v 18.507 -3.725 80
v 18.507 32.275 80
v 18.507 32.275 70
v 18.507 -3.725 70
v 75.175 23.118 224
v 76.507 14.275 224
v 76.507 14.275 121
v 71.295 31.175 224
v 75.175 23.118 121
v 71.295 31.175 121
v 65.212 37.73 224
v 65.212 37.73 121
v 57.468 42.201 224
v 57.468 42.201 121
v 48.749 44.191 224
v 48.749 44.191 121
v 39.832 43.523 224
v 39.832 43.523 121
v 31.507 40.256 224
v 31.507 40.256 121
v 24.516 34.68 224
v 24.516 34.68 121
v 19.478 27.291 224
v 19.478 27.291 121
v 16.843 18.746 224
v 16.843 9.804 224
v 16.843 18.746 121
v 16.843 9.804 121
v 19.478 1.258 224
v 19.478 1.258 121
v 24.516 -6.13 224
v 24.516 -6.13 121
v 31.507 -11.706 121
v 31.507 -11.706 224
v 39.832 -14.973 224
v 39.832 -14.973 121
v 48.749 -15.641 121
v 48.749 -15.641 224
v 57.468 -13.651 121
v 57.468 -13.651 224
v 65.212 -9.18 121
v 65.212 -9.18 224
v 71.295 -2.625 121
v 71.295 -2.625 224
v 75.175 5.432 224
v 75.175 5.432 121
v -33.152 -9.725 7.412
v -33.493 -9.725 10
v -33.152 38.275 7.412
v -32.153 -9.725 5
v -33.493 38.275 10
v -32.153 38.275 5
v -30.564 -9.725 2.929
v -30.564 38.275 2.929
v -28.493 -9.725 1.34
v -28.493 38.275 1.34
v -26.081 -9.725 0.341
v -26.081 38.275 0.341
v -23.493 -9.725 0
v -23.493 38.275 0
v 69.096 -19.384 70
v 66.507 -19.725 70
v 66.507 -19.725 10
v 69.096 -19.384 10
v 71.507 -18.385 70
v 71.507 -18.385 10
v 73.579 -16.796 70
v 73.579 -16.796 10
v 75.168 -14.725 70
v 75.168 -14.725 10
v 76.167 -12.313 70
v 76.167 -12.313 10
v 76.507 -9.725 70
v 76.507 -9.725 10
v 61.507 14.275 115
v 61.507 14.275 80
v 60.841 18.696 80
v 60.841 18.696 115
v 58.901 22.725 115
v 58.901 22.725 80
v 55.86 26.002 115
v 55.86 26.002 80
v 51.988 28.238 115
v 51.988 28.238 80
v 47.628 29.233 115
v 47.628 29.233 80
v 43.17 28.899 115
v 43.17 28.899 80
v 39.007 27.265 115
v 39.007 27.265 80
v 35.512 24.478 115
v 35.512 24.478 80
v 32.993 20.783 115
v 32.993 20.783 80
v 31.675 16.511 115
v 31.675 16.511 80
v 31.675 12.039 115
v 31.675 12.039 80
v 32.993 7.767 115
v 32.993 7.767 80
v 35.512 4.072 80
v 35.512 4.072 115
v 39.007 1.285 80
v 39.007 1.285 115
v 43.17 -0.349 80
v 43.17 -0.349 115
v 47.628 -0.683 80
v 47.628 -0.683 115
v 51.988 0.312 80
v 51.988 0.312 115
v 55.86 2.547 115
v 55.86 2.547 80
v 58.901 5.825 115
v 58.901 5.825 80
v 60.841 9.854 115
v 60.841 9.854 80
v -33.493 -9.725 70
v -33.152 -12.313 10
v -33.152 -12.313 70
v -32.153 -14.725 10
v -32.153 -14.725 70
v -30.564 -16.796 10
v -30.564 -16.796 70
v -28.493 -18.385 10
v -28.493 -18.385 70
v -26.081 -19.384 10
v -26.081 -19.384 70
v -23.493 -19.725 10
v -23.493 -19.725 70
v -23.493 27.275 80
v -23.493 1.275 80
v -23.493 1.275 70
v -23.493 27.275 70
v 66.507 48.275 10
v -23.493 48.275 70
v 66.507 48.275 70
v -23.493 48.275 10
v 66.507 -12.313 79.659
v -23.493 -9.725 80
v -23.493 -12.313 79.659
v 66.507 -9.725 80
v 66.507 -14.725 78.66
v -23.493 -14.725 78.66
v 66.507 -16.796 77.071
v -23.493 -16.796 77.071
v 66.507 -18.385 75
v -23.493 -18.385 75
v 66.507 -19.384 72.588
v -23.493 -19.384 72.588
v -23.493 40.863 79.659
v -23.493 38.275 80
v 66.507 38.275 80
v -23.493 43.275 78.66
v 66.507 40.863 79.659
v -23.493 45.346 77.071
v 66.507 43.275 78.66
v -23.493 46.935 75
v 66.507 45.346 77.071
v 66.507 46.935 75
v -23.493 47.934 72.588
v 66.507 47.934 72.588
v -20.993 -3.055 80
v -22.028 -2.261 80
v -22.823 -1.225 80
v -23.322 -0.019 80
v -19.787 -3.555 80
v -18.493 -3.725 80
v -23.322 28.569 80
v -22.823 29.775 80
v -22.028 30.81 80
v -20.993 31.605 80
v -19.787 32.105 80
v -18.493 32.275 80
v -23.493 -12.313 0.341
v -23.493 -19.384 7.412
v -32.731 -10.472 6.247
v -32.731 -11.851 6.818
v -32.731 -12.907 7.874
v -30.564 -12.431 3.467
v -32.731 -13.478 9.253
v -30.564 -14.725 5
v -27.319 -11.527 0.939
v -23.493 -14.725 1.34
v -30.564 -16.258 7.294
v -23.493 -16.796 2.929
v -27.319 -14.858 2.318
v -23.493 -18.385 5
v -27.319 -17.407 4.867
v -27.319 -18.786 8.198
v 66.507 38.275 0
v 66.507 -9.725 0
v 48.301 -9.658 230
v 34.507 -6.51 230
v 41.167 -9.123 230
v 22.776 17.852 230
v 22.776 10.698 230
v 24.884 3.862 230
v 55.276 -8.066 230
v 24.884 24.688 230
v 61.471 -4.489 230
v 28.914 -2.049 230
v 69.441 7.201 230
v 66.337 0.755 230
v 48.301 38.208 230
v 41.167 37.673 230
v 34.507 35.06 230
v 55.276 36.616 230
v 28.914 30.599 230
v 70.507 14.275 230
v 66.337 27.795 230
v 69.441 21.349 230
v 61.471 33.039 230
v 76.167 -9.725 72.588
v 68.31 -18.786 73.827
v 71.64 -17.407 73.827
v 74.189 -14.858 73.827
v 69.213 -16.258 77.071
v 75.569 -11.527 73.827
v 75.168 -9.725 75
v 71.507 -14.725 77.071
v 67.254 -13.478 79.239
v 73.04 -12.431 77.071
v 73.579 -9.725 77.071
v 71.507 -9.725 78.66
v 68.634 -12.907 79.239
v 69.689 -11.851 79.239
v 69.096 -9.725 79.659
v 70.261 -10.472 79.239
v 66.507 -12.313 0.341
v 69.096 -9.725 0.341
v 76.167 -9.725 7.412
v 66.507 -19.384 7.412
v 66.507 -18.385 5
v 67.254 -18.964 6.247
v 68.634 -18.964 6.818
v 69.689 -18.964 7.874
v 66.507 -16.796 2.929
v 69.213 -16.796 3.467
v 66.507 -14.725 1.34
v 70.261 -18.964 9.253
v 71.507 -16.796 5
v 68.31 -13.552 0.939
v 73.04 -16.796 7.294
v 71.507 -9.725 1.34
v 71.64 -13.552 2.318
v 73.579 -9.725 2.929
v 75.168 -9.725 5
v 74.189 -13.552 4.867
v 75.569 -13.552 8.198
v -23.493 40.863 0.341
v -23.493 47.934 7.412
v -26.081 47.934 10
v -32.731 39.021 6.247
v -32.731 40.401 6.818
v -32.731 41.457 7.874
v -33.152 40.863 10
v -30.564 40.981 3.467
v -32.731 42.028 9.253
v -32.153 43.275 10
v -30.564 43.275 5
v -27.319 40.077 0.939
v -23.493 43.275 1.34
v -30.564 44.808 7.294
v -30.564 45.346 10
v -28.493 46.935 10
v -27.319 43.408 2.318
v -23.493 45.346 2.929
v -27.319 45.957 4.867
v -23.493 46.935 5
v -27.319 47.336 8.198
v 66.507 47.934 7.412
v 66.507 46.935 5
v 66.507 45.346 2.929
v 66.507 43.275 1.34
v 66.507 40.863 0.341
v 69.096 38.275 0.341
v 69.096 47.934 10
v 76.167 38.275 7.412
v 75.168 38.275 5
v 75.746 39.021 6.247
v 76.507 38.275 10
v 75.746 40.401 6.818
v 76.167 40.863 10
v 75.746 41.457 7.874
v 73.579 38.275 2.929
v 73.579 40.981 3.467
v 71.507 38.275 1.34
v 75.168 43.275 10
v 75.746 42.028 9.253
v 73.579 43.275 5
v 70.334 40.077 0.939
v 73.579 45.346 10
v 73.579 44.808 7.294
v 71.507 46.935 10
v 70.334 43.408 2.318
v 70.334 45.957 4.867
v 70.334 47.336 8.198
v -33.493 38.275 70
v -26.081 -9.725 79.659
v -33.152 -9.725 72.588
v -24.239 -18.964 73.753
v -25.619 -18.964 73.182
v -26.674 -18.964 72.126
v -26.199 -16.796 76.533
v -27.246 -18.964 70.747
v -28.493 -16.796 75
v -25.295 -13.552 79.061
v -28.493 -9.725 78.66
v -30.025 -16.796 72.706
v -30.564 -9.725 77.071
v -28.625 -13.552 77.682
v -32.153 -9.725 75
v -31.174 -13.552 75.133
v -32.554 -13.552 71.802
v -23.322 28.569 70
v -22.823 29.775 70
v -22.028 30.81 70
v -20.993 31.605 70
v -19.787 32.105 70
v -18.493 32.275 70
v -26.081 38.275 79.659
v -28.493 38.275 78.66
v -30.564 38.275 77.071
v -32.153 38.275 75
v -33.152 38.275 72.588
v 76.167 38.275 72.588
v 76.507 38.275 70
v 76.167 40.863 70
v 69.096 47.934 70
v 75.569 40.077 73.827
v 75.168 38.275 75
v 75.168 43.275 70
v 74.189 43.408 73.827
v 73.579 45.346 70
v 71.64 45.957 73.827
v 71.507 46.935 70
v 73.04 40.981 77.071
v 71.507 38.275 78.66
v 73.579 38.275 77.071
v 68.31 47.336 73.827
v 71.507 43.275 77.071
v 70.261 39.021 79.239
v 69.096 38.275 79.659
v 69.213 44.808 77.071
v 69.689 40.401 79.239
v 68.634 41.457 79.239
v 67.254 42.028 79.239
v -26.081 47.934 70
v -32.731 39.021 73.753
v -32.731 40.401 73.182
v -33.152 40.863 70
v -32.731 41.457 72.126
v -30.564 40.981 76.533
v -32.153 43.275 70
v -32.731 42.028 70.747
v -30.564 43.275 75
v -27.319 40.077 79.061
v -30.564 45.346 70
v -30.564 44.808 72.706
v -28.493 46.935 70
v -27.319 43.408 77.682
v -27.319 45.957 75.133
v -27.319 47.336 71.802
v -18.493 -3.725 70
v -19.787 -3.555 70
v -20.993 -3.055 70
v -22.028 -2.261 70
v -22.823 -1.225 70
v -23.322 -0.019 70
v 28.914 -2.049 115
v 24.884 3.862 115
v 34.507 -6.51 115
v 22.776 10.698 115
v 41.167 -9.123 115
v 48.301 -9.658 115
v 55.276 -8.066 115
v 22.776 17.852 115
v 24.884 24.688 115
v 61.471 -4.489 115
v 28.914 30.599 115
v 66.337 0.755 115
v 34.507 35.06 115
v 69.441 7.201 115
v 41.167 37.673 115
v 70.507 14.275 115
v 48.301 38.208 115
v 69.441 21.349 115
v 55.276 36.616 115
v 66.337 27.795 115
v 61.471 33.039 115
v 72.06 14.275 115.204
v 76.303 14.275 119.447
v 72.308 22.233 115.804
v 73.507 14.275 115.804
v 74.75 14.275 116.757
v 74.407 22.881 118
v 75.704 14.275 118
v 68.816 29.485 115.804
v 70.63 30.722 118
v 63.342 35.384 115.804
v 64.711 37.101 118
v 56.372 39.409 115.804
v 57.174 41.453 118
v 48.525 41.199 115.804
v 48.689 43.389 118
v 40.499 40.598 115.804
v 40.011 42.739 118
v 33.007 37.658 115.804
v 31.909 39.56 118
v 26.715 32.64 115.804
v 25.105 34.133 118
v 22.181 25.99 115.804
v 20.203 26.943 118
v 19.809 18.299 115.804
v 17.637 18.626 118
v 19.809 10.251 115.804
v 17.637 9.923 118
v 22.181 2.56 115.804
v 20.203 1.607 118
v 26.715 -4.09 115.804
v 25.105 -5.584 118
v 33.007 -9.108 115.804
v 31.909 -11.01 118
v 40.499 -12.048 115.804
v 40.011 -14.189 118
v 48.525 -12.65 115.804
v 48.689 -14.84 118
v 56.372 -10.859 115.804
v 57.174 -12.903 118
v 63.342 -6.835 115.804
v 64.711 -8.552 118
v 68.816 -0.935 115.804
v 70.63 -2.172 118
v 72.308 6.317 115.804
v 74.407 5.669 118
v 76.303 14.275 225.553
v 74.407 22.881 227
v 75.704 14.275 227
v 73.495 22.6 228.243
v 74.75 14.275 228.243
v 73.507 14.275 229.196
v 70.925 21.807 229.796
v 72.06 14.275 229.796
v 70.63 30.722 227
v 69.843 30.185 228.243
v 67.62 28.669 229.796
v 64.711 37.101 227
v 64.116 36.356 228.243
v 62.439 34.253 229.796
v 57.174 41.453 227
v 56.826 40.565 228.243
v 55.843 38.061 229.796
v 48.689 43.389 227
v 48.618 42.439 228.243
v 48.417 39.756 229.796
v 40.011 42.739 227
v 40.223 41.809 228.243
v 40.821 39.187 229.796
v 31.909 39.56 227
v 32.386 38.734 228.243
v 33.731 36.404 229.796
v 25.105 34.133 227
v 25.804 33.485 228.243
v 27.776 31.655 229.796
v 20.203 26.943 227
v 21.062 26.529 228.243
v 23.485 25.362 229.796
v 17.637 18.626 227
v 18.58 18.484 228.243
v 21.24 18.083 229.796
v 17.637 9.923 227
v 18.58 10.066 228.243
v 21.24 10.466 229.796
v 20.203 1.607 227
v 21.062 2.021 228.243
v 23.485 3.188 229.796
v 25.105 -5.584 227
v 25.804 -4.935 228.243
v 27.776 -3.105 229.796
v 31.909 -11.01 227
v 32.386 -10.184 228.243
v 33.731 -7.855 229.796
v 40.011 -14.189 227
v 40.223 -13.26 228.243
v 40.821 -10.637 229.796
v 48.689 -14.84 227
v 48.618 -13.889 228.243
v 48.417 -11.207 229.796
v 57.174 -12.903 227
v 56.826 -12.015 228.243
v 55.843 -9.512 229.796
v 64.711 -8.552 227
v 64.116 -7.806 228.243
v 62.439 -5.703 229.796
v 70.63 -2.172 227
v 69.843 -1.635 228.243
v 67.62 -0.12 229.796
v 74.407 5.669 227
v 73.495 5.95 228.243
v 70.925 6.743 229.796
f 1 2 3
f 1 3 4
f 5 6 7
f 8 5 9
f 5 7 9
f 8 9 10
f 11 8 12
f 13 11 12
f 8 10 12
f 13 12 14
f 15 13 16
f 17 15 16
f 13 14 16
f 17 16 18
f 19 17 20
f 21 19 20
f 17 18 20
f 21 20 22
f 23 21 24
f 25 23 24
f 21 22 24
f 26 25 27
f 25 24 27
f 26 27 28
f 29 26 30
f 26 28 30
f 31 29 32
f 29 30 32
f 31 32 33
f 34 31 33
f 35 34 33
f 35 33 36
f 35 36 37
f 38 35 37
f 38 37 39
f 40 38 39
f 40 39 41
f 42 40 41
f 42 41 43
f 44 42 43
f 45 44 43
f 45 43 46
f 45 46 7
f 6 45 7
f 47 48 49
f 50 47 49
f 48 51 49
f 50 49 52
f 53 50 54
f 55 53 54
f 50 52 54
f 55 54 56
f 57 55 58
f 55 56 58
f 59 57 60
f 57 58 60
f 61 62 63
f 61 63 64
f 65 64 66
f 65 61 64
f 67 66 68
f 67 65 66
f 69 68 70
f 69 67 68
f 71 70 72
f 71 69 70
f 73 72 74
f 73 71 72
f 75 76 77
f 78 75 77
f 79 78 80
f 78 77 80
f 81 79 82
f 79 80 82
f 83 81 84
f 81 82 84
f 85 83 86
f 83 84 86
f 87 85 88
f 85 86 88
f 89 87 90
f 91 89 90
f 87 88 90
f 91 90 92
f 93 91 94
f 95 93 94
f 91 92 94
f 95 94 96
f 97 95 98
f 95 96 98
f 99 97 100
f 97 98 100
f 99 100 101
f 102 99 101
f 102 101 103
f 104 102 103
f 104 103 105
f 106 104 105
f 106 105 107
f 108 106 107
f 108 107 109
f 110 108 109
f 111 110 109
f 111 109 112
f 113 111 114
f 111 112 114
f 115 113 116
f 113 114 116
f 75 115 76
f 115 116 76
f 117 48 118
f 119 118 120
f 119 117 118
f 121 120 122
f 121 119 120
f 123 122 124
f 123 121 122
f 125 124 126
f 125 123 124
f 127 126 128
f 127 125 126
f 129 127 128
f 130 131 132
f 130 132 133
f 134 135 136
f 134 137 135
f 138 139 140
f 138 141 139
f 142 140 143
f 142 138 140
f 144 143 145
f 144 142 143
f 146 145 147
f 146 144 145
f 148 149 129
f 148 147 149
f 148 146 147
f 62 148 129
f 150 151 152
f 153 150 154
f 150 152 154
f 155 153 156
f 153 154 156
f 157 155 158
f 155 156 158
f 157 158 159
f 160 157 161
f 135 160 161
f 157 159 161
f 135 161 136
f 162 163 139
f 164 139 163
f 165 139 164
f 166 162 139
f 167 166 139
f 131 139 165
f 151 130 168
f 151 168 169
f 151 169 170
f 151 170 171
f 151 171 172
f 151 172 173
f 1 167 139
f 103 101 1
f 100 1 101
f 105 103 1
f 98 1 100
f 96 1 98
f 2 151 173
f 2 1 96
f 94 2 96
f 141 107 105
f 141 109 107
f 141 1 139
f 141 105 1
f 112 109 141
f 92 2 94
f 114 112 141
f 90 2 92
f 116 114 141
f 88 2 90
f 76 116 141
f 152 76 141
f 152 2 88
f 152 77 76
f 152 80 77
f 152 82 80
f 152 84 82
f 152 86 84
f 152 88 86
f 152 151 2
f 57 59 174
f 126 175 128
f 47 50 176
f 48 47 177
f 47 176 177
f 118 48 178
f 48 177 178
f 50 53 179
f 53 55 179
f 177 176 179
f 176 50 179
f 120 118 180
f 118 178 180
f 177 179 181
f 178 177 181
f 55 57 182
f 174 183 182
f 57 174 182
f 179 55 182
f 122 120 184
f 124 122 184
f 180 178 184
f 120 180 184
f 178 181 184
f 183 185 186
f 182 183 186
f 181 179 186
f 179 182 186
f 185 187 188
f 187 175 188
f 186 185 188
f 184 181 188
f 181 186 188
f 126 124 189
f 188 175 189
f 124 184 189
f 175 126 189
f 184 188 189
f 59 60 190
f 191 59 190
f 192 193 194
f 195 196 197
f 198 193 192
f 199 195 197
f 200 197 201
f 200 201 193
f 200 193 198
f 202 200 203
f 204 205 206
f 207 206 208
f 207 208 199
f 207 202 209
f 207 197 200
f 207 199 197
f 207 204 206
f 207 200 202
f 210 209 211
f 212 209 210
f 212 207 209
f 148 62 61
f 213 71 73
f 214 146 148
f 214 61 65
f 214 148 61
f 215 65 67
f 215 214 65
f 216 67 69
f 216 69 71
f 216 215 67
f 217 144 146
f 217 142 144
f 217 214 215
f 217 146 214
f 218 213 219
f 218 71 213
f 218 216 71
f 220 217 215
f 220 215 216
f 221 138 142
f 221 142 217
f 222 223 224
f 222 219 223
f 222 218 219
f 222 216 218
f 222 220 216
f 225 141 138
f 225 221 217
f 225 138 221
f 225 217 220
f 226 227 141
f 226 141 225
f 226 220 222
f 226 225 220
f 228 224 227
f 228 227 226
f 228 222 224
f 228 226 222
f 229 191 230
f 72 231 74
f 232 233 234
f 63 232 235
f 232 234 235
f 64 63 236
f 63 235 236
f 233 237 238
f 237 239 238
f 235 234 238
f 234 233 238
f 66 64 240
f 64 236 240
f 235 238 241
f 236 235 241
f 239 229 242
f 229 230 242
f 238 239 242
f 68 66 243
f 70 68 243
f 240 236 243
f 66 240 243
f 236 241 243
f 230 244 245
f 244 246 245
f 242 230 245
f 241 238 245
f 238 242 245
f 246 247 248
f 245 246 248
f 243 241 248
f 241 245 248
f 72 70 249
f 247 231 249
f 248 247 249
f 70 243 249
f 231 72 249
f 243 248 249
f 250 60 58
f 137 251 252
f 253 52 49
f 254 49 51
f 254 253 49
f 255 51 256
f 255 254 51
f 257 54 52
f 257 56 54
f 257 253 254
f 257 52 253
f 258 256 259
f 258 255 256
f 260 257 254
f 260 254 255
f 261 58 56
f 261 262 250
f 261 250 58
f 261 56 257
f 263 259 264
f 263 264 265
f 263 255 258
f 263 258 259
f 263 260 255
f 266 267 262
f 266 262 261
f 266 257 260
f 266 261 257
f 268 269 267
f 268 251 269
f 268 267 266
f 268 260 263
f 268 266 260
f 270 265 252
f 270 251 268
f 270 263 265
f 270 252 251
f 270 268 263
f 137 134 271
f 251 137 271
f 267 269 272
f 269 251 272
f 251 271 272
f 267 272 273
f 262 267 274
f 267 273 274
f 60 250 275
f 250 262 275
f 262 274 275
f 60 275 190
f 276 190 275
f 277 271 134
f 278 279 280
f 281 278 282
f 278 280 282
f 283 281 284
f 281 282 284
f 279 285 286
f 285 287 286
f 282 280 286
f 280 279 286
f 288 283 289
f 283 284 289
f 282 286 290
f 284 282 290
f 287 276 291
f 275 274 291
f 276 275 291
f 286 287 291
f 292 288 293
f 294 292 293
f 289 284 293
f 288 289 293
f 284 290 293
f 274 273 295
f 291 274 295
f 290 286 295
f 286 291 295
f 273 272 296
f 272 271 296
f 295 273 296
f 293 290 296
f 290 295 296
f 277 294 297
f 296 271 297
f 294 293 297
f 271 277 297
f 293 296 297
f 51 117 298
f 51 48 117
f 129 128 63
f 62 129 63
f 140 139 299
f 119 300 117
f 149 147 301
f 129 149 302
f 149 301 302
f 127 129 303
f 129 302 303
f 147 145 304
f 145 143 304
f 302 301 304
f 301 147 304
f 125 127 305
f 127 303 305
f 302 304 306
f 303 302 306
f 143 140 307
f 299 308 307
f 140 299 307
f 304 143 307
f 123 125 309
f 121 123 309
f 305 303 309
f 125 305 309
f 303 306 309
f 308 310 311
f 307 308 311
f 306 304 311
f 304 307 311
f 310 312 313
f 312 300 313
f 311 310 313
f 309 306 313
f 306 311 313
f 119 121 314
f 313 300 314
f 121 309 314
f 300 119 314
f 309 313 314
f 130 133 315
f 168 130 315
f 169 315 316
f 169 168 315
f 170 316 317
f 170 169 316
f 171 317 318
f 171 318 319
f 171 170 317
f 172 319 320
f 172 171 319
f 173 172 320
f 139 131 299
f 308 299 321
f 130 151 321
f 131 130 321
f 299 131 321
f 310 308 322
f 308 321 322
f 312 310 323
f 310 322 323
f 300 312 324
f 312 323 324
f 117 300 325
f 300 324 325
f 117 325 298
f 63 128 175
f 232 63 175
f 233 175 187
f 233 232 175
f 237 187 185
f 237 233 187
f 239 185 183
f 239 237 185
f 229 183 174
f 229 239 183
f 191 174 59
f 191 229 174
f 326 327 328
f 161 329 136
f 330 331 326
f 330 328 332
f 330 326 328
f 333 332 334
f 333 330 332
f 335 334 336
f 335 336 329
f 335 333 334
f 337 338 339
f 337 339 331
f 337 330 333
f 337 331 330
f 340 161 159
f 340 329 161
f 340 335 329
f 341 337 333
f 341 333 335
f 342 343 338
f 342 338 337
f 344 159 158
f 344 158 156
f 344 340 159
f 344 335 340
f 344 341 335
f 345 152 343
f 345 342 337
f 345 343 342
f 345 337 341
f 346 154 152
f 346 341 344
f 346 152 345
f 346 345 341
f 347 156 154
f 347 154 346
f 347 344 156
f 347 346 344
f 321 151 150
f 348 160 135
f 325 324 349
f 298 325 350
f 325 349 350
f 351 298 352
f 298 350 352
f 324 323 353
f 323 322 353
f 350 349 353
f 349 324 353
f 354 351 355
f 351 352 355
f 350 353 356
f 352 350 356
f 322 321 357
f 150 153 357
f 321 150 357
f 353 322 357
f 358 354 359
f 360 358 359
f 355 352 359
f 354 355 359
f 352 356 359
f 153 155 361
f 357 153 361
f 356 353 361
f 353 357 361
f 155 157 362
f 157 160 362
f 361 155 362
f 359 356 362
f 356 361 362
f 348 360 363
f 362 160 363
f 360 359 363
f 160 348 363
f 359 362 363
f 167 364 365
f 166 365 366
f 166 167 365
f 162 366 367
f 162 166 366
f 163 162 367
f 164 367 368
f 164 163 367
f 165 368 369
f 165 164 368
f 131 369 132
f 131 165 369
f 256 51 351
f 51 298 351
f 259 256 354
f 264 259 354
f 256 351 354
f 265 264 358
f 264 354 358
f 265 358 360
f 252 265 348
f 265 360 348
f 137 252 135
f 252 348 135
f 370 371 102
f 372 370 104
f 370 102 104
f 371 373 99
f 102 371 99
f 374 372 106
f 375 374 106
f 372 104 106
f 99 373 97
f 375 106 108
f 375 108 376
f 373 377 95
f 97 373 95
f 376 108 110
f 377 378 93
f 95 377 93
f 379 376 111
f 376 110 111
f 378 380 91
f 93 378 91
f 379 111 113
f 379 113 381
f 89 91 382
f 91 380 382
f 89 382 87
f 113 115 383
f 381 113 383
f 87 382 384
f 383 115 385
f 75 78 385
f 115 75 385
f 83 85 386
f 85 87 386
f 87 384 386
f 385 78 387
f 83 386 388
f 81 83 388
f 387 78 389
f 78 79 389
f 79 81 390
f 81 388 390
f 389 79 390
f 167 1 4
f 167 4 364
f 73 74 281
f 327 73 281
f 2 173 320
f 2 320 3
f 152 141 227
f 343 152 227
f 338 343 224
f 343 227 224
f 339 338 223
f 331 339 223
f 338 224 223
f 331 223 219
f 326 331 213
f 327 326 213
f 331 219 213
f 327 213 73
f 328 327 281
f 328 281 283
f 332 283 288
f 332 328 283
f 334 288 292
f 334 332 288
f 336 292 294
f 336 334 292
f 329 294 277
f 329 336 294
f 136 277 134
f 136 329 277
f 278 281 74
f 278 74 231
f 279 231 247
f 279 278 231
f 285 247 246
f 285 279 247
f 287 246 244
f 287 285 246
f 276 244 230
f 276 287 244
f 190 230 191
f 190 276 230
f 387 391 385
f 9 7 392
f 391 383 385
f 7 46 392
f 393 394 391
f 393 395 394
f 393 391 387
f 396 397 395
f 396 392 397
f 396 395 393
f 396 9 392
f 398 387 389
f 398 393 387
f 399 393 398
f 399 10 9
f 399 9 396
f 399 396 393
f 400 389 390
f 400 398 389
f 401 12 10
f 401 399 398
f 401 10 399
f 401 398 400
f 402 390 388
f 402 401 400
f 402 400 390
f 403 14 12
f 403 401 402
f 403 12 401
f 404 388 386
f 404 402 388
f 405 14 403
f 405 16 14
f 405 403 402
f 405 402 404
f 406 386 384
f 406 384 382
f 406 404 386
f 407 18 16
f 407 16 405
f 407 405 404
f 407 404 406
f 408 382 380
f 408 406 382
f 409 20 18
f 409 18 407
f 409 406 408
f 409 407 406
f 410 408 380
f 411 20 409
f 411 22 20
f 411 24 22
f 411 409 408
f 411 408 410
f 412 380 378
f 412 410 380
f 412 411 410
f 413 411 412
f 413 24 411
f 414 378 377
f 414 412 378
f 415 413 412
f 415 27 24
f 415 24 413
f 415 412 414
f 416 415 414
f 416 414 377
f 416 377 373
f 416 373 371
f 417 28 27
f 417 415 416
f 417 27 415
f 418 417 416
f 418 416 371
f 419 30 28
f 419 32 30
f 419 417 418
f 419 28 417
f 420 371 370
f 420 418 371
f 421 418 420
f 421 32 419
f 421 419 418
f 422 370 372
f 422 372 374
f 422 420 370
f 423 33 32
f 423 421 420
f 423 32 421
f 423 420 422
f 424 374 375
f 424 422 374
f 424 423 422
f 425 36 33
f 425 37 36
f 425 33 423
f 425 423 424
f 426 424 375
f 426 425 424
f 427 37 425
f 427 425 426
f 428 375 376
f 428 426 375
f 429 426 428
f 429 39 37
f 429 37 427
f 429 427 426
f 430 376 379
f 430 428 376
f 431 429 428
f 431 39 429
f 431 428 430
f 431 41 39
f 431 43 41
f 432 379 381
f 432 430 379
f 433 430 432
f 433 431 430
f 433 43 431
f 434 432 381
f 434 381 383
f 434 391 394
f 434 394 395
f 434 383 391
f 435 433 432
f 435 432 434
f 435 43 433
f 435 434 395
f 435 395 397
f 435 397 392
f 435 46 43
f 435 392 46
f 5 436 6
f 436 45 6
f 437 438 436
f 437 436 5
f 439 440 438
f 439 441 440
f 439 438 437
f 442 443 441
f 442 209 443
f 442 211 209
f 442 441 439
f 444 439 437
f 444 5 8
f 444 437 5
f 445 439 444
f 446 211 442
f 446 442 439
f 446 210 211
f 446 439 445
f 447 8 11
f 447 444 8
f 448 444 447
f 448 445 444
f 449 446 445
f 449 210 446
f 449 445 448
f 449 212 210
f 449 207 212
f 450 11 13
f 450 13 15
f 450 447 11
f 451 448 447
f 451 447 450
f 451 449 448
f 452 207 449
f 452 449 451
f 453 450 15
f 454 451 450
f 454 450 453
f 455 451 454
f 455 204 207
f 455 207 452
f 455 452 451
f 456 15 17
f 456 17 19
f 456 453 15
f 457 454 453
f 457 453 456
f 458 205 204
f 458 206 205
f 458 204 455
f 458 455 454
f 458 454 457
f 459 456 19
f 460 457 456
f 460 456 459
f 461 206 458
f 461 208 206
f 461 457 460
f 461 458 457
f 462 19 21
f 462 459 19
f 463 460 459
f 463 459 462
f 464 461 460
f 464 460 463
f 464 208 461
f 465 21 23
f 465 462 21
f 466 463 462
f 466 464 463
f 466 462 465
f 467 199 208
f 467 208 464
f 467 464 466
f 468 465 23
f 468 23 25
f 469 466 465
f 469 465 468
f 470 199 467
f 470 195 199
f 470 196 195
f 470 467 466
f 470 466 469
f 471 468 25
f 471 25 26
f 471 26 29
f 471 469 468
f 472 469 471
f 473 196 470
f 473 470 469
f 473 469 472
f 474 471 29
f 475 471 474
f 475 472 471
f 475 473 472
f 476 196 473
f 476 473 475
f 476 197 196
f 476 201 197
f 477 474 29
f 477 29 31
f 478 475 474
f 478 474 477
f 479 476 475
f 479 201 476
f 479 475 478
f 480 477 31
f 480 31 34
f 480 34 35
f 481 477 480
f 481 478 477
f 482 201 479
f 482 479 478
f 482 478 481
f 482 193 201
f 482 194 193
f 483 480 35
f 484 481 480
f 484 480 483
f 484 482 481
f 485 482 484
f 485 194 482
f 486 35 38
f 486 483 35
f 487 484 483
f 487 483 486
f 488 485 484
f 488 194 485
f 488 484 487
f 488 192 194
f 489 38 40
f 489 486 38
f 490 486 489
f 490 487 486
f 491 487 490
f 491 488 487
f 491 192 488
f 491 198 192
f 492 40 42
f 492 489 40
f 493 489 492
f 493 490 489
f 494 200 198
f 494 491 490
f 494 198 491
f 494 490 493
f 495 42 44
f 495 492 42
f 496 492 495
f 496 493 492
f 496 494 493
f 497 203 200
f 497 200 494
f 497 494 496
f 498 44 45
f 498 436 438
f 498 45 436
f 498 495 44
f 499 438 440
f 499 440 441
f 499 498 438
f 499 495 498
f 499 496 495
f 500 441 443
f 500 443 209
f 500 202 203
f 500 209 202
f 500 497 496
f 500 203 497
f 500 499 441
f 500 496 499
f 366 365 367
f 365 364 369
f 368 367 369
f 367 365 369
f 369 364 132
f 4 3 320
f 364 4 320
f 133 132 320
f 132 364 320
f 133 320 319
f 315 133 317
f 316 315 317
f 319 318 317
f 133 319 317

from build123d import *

# Parameters (mm, degrees)
ESQUISSE1_W             = 110
ESQUISSE1_H             = 68
BOSS_EXTRU_1_DEPTH      = 80
ESQUISSE2_R             = 30
BOSS_EXTRU_2_DEPTH      = 150
CONG_2_R                = 6
ESQUISSE8_R             = 30
ESQUISSE8_R_2           = 15
ENL_V_MAT_EXTRU_1_DEPTH = 35
CONG_3_R                = 6
CONG_4_R                = 10
CONG_5_R                = 10
ENL_V_MAT_EXTRU_2_DEPTH = 10


with BuildPart() as part:
    # Esquisse1 → Boss.-Extru.1 (new body)
    with BuildSketch(Plane.XY):
        with Locations((21.507469619, 14.274916944)):
            Rectangle(ESQUISSE1_W, ESQUISSE1_H)
    extrude(amount=BOSS_EXTRU_1_DEPTH)

    # Esquisse2 → Boss.-Extru.2 (add)
    with BuildSketch(Plane.XY.offset(80)):
        with Locations((46.507469619, 14.274916944)):
            Circle(ESQUISSE2_R)
    extrude(amount=BOSS_EXTRU_2_DEPTH)

    # Congé2
    cong_2_edges = [part.edges().sort_by_distance(p)[0] for p in [
        (16.507469619, 14.274916944, 230),
    ]]
    fillet(cong_2_edges, radius=CONG_2_R)

    # Esquisse8 → Enlèv. mat.-Extru.1 (cut)
    with BuildSketch(Plane.XY.offset(80)):
        with Locations((46.507469619, 14.274916944)):
            Circle(ESQUISSE8_R)
        with Locations((46.507469619, 14.274916944)):
            Circle(ESQUISSE8_R_2, mode=Mode.SUBTRACT)
    extrude(amount=ENL_V_MAT_EXTRU_1_DEPTH, mode=Mode.SUBTRACT)

    # Congé3
    cong_3_edges = [part.edges().sort_by_distance(p)[0] for p in [
        (16.507469619, 14.274916944, 115),
    ]]
    fillet(cong_3_edges, radius=CONG_3_R)

    # Congé4
    cong_4_edges = [part.edges().sort_by_distance(p)[0] for p in [
        (21.507469619, 48.274916944, 80),
        (-33.492530381, 14.274916944, 80),
        (21.507469619, 48.274916944, 0),
        (76.507469619, 14.274916944, 0),
        (21.507469619, -19.725083056, 0),
        (-33.492530381, 14.274916944, 0),
        (21.507469619, -19.725083056, 80),
        (-33.492530381, 48.274916944, 40),
        (76.507469619, 48.274916944, 40),
        (76.507469619, -19.725083056, 40),
        (-33.492530381, -19.725083056, 40),
    ]]
    fillet(cong_4_edges, radius=CONG_4_R)

    # Congé5
    # the kernel refuses this fillet: 10 mm, written as the material it takes off along each edge
    with BuildSketch(Plane(origin=(66.507469619, -9.725083056, 70), x_dir=(1, 0, 0), z_dir=(0, 0, 1))) as cong_5_piece_1_section:
        Polygon((0, 0), (CONG_5_R, 0), (CONG_5_R, -CONG_5_R), (0, -CONG_5_R), align=None)
    cong_5_piece_1 = extrude(amount=CONG_5_R, mode=Mode.PRIVATE)
    cong_5_piece_1 = cong_5_piece_1 - Plane(origin=(66.507469619, -9.725083056, 70), x_dir=(-0.7071067811865475, 0.7071067811865475, 0), z_dir=(0, 0, 1)) * Sphere(CONG_5_R, mode=Mode.PRIVATE)
    add(cong_5_piece_1, mode=Mode.SUBTRACT)
    with BuildSketch(Plane(origin=(66.507469619, 38.274916944, 70), x_dir=(1, 0, 0), z_dir=(0, 0, 1))) as cong_5_piece_2_section:
        Polygon((0, 0), (CONG_5_R, 0), (CONG_5_R, CONG_5_R), (0, CONG_5_R), align=None)
    cong_5_piece_2 = extrude(amount=CONG_5_R, mode=Mode.PRIVATE)
    cong_5_piece_2 = cong_5_piece_2 - Plane(origin=(66.507469619, 38.274916944, 70), x_dir=(-0.7071067811865475, -0.7071067811865475, 0), z_dir=(0, 0, 1)) * Sphere(CONG_5_R, mode=Mode.PRIVATE)
    add(cong_5_piece_2, mode=Mode.SUBTRACT)
    with BuildSketch(Plane(origin=(76.507469619, -9.725083056, 80), x_dir=(-1, 0, 0), z_dir=(0, 1, 0))) as cong_5_piece_3:
        with BuildLine():
            CenterArc((CONG_5_R, -CONG_5_R), CONG_5_R, 90, 90)
            Line((0, -CONG_5_R), (0, 0))
            Line((0, 0), (CONG_5_R, 0))
        make_face()
    extrude(amount=48, mode=Mode.SUBTRACT)

    # Esquisse9 → Enlèv. mat.-Extru.2 (cut)
    with BuildSketch(Plane.XY.offset(80)):
        with BuildLine():
            Line((-18.492530381, 32.274916944), (18.507469619, 32.274916944))
            Line((18.507469619, 32.274916944), (18.507469619, -3.725083056))
            Line((18.507469619, -3.725083056), (-18.492530381, -3.725083056))
            ThreePointArc((-18.492530381, -3.725083056), (-22.028064287, -2.260616962), (-23.492530381, 1.274916944))
            Line((-23.492530381, 1.274916944), (-23.492530381, 27.274916944))
            ThreePointArc((-23.492530381, 27.274916944), (-22.028064287, 30.810450849), (-18.492530381, 32.274916944))
        make_face()
    extrude(amount=-ENL_V_MAT_EXTRU_2_DEPTH, mode=Mode.SUBTRACT)


solid = part.part
